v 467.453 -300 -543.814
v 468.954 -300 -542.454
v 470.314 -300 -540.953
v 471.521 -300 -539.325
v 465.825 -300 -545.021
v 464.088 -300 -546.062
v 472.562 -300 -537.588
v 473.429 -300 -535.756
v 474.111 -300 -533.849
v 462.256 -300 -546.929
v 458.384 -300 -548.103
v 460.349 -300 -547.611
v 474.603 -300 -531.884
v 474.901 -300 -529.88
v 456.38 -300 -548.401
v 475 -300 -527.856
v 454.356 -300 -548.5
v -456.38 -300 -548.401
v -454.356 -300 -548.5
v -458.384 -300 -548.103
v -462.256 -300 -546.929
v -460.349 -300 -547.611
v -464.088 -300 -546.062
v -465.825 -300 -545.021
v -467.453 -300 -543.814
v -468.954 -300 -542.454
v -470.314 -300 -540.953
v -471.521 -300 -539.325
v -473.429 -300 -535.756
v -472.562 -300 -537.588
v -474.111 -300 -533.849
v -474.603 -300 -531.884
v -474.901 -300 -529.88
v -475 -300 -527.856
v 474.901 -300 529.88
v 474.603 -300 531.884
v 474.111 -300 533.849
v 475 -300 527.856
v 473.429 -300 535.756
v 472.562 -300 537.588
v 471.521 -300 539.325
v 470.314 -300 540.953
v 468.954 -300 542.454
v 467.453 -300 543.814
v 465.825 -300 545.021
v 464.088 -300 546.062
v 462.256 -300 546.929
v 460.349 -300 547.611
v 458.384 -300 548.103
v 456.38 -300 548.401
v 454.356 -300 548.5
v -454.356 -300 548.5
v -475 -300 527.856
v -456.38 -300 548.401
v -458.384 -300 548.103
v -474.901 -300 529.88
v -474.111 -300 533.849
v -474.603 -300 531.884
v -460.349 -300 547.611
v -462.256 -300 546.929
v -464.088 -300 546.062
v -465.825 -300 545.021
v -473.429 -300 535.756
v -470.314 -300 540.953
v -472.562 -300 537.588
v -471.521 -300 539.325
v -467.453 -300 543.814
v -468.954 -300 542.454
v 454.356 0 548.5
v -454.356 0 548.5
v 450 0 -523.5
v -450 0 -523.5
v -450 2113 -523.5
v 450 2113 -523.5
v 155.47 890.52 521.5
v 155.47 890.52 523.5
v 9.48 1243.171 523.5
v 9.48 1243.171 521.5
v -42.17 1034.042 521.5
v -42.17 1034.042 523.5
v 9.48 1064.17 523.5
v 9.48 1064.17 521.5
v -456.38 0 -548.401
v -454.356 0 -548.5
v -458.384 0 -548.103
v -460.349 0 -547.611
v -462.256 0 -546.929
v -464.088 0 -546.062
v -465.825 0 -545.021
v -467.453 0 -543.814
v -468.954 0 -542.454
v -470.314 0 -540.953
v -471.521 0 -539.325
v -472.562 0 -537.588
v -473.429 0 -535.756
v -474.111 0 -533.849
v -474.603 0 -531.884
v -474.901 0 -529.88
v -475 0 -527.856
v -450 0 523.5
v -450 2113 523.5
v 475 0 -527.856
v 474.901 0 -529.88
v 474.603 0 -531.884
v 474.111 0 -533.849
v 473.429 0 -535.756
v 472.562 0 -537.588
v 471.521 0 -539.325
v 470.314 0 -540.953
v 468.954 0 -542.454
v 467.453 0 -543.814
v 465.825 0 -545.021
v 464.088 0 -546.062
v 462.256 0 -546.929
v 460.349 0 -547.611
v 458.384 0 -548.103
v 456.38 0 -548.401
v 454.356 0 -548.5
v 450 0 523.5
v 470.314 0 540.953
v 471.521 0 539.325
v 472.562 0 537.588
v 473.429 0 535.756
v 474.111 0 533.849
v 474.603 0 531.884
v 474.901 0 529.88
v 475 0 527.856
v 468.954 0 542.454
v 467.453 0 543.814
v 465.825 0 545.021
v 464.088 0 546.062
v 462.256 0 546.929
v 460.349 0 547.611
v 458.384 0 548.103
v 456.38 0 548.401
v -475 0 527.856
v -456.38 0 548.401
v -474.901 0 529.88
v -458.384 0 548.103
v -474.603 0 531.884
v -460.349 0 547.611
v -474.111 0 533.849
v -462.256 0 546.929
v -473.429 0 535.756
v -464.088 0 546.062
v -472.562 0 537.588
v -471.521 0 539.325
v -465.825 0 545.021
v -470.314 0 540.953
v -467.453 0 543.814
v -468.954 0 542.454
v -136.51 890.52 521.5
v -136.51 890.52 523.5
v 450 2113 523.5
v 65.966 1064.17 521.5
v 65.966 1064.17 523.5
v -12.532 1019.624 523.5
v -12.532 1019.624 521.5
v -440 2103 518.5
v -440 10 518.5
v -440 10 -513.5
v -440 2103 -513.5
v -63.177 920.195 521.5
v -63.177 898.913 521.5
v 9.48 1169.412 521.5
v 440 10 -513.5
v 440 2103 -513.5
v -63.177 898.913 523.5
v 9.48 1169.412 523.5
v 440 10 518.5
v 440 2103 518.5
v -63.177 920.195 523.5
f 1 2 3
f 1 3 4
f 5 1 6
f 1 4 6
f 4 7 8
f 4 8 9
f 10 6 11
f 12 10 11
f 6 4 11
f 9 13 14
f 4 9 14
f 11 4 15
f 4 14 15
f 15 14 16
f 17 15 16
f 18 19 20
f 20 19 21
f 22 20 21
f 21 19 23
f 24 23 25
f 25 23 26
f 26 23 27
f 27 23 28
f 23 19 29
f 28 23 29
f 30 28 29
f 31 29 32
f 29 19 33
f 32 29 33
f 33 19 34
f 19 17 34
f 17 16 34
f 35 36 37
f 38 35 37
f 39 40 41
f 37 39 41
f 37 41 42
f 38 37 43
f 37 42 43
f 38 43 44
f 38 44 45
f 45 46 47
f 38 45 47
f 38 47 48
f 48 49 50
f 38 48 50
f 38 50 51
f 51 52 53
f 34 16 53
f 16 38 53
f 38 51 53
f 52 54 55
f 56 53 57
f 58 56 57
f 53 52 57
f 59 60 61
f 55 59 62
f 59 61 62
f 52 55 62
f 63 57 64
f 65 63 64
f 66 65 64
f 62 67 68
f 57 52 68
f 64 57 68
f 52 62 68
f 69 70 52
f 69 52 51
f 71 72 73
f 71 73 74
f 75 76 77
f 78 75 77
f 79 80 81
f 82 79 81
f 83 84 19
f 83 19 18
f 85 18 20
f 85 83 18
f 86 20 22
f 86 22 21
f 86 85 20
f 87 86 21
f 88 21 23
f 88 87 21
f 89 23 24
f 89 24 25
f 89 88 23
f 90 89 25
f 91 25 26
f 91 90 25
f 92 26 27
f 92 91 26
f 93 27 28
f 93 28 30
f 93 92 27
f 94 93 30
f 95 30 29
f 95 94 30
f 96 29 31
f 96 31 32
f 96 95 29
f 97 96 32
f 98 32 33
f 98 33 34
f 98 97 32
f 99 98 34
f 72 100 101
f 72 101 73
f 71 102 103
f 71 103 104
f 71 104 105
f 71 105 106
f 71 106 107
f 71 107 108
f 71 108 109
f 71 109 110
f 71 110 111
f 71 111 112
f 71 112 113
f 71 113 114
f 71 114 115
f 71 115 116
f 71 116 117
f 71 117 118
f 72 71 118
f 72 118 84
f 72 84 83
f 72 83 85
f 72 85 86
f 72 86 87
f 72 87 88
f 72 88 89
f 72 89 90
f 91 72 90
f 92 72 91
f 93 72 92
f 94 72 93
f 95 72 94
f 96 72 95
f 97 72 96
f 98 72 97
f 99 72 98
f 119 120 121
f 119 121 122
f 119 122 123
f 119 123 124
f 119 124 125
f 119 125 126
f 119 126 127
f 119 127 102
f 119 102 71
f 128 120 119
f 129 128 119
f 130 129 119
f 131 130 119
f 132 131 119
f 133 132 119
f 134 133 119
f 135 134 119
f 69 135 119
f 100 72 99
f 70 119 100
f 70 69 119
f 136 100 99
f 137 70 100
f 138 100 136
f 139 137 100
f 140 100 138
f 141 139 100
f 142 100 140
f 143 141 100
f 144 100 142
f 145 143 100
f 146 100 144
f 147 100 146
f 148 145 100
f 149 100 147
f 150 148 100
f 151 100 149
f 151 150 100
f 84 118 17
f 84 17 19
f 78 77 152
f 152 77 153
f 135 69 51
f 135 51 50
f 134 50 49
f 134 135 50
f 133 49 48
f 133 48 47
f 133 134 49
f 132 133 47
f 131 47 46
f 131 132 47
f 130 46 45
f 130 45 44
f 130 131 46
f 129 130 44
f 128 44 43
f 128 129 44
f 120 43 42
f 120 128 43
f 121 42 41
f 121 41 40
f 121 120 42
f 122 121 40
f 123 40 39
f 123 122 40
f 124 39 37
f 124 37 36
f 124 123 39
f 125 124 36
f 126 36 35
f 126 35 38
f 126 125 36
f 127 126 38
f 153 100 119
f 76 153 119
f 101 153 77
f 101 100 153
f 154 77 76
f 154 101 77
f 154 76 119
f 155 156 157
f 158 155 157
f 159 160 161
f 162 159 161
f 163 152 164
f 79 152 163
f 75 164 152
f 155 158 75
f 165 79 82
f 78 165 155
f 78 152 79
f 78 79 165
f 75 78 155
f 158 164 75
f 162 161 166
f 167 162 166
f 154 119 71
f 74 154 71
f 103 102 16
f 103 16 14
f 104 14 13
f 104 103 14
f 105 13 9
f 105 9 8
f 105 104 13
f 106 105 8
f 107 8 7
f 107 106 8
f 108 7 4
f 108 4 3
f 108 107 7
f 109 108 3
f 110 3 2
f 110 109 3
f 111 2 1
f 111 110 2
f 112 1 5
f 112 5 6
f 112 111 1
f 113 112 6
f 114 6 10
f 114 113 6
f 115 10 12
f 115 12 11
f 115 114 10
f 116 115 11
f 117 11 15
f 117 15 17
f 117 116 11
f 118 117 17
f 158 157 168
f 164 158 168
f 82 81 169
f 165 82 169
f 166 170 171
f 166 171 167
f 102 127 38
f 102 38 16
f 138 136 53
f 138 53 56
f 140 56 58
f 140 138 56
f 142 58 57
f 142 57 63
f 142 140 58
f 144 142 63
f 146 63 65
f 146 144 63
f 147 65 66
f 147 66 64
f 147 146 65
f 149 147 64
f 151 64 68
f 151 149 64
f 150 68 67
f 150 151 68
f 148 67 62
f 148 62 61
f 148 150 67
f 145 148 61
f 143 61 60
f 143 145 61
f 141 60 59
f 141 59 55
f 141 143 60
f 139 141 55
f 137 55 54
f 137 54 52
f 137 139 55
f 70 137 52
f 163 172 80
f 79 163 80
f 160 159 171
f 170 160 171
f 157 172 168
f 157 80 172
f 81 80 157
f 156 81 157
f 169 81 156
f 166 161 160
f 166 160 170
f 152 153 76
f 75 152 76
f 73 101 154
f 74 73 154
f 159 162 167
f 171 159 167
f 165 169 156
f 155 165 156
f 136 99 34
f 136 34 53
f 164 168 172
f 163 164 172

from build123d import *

# Parameters (mm, degrees)
CROQUIS1_W              = 900
CROQUIS1_H              = 1047
SALIENTE_EXTRUIR1_DEPTH = 2113
VACIADO2_T              = -10
CROQUIS2_W              = 880
CROQUIS2_H              = 2093
SALIENTE_EXTRUIR2_DEPTH = 5
CORTAR_EXTRUIR1_DEPTH   = 2
SALIENTE_EXTRUIR3_DEPTH = 300


with BuildPart() as part:
    # Croquis1 → Saliente-Extruir1 (new body)
    with BuildSketch(Plane(origin=(0, 0, 0), x_dir=(1, 0, 0), z_dir=(0, 1, 0))):
        Rectangle(CROQUIS1_W, CROQUIS1_H)
    extrude(amount=SALIENTE_EXTRUIR1_DEPTH)

    # Vaciado2
    vaciado2_openings = [part.faces().sort_by_distance(p)[0] for p in [
        (0, 1056.5, 523.5),
    ]]
    offset(amount=VACIADO2_T, openings=vaciado2_openings, kind=Kind.INTERSECTION)

    # Croquis2 → Saliente-Extruir2 (add)
    with BuildSketch(Plane.XY.offset(523.5)):
        with Locations((0, 1056.5)):
            Rectangle(CROQUIS2_W, CROQUIS2_H)
    extrude(amount=-SALIENTE_EXTRUIR2_DEPTH)

    # Croquis3 → Cortar-Extruir1 (cut)
    with BuildSketch(Plane.XY.offset(523.5)):
        Polygon((-136.509991439, 890.520139483), (155.469712472, 890.520139483), (9.479860517, 1243.170950701), align=None)
        Polygon((-63.176808732, 920.19459615), (-42.169545822, 1034.041849102), (9.479860517, 1064.169920858), (9.479860517, 1169.411963853), (65.966344659, 1064.169920858), (-12.532301764, 1019.623730372), (-63.176808732, 898.913148296), align=None, mode=Mode.SUBTRACT)
    extrude(amount=-CORTAR_EXTRUIR1_DEPTH, mode=Mode.SUBTRACT)

    # Croquis4 → Saliente-Extruir3 (add)
    with BuildSketch(Plane.XZ):
        with BuildLine():
            Line((-454.35645152, 548.5), (454.35645152, 548.5))
            ThreePointArc((454.35645152, 548.5), (468.953644638, 542.453644638), (475, 527.85645152))
            Line((475, 527.85645152), (475, -527.85645152))
            ThreePointArc((475, -527.85645152), (468.953644638, -542.453644638), (454.35645152, -548.5))
            Line((454.35645152, -548.5), (-454.35645152, -548.5))
            ThreePointArc((-454.35645152, -548.5), (-468.953644638, -542.453644638), (-475, -527.85645152))
            Line((-475, -527.85645152), (-475, 527.85645152))
            ThreePointArc((-475, 527.85645152), (-468.953644638, 542.453644638), (-454.35645152, 548.5))
        make_face()
    extrude(amount=SALIENTE_EXTRUIR3_DEPTH)


solid = part.part
